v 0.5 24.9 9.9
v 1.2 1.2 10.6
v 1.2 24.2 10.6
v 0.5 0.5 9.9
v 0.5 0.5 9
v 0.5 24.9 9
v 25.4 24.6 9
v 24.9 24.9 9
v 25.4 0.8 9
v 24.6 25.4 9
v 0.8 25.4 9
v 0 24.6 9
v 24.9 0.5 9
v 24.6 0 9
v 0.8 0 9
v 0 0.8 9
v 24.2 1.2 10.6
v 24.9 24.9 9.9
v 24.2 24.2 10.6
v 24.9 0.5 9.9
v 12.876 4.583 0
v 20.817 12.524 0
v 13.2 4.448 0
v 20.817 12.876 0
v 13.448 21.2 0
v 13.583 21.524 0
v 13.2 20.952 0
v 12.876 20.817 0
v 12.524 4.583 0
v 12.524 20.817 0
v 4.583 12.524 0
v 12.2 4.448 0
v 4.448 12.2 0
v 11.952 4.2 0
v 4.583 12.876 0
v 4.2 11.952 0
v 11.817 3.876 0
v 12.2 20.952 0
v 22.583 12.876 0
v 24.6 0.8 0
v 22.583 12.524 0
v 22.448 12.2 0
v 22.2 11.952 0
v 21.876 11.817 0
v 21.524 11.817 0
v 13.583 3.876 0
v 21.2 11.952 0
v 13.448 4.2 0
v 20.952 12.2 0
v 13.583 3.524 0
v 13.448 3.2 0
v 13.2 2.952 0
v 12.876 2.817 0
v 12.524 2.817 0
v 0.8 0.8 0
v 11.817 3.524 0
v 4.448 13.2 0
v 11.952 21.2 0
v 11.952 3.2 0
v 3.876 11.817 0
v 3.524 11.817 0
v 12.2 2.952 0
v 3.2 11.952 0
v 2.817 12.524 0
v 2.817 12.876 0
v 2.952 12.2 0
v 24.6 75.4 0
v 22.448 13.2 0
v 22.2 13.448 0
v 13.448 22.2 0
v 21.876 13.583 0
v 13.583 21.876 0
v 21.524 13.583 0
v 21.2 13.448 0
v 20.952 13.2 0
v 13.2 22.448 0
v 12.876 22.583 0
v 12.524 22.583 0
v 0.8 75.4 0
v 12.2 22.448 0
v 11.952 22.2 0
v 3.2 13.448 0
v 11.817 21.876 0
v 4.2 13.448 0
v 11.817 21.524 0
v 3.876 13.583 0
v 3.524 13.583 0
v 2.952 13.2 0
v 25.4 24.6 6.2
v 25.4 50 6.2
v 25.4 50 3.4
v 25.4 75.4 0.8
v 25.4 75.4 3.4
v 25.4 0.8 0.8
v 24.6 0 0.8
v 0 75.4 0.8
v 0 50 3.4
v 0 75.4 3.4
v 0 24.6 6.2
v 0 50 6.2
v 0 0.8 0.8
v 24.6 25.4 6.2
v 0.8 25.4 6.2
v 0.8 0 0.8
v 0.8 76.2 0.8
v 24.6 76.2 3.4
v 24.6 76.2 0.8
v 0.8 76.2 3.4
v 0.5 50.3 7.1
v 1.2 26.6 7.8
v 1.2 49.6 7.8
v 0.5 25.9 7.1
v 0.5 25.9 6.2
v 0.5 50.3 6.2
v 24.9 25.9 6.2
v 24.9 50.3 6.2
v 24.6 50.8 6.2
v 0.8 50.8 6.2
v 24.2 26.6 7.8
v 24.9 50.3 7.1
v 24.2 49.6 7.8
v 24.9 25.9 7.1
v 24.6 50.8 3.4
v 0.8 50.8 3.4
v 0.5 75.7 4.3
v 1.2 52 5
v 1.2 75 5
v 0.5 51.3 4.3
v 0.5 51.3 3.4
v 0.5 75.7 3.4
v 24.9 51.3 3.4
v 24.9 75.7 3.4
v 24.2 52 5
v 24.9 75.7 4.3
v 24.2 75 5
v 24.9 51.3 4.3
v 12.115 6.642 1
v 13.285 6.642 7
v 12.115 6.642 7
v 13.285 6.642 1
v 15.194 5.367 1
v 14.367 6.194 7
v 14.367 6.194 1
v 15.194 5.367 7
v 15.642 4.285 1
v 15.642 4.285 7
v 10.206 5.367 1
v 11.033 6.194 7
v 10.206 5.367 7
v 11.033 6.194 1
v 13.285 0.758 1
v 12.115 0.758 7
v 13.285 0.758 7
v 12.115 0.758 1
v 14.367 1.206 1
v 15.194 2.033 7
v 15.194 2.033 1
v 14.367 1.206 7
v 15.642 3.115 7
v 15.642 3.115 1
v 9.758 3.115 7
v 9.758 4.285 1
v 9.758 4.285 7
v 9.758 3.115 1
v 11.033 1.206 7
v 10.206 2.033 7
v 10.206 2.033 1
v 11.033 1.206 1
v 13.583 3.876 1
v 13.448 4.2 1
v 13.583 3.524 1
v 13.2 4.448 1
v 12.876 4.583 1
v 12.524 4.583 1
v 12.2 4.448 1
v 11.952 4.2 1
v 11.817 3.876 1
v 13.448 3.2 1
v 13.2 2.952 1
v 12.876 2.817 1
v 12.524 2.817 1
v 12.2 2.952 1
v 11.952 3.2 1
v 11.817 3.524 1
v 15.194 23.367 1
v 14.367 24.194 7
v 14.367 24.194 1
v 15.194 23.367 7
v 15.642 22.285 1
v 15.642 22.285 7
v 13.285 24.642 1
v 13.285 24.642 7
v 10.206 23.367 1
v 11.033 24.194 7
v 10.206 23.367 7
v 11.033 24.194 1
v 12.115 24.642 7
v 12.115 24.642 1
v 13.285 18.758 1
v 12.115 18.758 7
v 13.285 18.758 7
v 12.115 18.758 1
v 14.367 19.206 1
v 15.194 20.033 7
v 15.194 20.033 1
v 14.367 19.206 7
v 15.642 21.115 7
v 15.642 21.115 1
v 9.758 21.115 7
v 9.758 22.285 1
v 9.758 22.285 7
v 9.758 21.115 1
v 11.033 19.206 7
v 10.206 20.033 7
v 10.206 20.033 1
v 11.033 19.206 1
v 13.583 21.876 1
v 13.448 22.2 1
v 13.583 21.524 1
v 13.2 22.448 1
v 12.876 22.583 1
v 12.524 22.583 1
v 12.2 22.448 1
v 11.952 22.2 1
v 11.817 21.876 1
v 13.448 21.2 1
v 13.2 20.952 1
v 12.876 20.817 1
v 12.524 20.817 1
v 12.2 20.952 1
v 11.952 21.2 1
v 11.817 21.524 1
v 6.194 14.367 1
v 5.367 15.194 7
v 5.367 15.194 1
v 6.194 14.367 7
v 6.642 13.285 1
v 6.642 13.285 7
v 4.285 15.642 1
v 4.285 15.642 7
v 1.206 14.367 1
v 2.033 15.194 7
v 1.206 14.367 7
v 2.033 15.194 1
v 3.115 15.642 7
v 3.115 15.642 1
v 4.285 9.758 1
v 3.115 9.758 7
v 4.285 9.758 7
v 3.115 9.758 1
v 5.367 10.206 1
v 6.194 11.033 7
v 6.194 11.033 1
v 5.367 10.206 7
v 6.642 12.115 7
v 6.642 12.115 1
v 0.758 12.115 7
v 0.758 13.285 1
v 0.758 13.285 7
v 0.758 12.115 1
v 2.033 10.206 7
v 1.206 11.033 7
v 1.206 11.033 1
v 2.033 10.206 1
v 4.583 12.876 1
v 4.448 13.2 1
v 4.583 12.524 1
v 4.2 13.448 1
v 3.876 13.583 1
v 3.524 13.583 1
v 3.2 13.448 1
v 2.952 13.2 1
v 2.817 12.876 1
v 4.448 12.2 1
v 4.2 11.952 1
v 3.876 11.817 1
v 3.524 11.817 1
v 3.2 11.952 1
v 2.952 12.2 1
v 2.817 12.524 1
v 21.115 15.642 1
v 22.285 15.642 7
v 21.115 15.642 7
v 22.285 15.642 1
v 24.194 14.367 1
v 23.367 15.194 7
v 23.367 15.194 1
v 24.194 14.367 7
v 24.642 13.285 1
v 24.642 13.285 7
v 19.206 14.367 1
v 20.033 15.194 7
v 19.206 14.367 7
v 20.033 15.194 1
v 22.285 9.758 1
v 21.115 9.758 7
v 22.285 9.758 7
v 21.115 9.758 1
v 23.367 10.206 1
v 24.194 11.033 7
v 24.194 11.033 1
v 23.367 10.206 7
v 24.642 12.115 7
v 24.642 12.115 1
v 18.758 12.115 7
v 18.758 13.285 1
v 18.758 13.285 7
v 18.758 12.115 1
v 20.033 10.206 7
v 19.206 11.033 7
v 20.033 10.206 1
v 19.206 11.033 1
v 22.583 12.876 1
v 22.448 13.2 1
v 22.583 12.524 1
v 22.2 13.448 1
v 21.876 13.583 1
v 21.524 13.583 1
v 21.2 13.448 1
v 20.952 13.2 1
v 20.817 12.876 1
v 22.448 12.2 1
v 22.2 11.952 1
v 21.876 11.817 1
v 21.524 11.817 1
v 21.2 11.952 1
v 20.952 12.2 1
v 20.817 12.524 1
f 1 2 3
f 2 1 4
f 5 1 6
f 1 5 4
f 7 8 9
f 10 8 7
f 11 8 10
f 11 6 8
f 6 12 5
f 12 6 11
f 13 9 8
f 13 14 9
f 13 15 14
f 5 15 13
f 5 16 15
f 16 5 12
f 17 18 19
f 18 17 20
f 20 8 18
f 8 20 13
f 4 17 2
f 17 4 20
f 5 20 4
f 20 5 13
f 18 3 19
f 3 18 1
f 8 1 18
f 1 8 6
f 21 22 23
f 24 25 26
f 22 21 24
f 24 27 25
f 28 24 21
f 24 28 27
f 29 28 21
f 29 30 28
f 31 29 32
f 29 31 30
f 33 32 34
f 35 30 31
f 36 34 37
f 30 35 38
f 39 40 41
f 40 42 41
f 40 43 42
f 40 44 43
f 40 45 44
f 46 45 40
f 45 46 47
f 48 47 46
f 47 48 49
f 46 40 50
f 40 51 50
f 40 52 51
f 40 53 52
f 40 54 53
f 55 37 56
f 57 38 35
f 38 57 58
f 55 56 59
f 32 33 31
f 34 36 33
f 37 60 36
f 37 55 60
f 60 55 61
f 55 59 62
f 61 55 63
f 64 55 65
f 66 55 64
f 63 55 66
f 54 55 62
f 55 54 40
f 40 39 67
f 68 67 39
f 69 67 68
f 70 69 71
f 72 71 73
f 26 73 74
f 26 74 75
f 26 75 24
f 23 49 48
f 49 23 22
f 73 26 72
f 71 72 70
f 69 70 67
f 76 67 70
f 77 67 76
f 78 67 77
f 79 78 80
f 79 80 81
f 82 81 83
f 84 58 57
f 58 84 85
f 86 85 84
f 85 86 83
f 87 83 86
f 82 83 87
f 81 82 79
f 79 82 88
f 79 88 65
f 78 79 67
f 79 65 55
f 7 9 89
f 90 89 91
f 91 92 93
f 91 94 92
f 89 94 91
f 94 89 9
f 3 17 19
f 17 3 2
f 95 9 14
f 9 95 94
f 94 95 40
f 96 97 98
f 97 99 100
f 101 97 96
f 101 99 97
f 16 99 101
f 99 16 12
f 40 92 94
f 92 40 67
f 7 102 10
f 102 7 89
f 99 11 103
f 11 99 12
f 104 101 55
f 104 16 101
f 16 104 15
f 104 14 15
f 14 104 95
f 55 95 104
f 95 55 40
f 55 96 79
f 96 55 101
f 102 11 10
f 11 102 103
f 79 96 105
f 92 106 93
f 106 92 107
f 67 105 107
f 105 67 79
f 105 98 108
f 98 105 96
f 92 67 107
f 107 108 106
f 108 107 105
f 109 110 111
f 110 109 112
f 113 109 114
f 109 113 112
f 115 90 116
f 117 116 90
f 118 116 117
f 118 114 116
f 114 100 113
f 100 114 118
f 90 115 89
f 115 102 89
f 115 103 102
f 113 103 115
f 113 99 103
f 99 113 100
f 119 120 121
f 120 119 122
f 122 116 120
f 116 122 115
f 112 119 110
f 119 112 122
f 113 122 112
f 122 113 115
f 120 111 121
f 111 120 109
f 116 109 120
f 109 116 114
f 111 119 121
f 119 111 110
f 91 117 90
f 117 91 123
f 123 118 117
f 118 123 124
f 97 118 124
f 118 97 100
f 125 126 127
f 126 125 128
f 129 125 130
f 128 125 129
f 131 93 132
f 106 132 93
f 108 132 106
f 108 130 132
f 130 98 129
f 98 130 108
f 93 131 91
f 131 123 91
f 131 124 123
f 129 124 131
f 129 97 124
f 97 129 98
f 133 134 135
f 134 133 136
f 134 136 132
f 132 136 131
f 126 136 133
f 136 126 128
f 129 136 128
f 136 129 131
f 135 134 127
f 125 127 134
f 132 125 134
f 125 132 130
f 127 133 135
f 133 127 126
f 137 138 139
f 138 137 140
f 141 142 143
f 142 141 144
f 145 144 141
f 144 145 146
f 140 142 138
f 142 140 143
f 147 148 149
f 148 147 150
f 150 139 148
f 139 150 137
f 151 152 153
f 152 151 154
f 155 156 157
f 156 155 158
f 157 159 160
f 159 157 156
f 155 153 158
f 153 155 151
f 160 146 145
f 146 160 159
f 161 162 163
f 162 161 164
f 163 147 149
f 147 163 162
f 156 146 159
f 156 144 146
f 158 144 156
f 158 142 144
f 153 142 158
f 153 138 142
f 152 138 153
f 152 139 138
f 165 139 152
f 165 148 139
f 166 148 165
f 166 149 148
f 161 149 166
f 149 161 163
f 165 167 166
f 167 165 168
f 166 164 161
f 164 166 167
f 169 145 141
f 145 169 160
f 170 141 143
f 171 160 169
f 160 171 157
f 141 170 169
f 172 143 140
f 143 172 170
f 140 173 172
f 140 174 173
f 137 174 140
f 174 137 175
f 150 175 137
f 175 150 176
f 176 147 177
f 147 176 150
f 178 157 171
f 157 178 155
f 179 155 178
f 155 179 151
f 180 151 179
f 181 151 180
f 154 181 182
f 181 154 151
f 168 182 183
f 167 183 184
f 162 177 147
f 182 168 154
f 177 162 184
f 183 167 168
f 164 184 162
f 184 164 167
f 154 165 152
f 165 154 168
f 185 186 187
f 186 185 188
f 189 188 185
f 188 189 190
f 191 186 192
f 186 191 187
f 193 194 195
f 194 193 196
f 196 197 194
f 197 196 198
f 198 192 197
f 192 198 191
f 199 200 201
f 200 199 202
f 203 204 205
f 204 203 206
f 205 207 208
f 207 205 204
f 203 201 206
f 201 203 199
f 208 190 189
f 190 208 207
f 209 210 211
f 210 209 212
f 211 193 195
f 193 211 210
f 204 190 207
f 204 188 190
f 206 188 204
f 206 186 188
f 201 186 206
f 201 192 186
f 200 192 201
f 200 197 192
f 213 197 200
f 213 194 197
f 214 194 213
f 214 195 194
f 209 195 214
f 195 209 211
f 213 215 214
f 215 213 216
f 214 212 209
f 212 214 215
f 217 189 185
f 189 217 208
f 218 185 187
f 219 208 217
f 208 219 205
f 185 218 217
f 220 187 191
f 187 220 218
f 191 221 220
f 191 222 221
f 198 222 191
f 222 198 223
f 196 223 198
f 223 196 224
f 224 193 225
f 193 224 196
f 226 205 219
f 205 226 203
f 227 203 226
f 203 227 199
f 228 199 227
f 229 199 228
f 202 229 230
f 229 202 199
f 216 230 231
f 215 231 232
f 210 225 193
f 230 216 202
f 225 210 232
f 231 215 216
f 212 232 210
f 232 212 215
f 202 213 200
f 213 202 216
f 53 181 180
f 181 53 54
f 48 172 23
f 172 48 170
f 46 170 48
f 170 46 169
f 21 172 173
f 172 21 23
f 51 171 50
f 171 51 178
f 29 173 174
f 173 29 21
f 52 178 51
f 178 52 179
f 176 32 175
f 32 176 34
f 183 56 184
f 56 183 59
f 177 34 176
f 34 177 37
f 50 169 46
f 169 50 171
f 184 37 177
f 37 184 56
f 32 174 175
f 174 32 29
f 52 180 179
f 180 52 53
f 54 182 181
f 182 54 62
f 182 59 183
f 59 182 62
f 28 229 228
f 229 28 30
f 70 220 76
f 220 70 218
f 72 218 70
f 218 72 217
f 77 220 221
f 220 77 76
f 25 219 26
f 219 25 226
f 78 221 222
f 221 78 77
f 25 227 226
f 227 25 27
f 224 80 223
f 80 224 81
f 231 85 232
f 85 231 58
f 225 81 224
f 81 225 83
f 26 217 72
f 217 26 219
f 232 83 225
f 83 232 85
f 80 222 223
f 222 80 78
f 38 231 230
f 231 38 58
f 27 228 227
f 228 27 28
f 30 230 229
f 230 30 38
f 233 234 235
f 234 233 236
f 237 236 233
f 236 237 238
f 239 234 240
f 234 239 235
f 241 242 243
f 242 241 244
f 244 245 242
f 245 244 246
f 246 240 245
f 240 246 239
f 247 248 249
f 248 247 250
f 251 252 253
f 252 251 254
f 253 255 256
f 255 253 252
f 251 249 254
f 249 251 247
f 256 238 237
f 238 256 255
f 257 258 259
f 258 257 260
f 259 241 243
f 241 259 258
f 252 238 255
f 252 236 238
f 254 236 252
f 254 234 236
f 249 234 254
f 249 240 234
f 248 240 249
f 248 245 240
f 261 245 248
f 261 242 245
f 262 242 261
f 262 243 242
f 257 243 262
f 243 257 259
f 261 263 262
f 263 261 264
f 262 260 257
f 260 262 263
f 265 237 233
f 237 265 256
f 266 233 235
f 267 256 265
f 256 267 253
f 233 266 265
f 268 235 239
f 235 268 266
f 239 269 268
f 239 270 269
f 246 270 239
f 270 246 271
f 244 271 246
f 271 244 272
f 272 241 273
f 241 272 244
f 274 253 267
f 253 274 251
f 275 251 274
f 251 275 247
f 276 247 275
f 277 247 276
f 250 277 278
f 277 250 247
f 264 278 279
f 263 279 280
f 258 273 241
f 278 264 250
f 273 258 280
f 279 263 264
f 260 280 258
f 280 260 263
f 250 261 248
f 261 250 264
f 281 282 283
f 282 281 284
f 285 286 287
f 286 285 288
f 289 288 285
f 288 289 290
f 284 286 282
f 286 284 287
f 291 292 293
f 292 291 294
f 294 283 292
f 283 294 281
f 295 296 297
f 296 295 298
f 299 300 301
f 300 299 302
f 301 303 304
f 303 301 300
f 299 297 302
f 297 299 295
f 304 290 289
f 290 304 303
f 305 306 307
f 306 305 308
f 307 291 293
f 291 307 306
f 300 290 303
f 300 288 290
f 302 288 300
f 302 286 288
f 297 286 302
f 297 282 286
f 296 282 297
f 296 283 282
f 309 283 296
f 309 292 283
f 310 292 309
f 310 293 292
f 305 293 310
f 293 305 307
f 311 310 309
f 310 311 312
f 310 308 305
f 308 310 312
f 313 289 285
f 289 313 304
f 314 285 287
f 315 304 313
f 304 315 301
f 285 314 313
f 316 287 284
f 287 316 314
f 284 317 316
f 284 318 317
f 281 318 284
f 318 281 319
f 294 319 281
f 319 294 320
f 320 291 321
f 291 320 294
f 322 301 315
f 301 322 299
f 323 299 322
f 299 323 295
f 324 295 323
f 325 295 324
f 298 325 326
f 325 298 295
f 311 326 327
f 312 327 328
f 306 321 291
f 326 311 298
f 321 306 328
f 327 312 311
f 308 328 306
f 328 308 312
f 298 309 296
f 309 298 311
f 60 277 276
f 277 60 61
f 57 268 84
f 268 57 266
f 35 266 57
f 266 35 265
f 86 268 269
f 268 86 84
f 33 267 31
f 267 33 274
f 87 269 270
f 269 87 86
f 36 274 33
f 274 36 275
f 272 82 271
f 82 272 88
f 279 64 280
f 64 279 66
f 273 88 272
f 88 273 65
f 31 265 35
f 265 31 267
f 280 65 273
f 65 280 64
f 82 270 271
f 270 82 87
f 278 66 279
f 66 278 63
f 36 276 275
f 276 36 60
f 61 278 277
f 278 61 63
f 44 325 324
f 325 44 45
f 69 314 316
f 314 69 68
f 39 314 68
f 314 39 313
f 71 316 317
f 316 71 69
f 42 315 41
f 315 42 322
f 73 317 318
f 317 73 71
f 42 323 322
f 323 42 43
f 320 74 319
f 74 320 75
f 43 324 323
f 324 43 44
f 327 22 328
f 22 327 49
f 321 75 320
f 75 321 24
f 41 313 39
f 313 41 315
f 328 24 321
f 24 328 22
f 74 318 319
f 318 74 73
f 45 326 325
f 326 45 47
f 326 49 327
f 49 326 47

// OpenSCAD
// file: stairs_01_solid.scad
include <libs.scad>;
use <floor_01_solid.scad>;
use <wall_01_solid.scad>;

open_ascending_stair(1,4);
*translate([basis*2,0,0])open_descending_stair(1,3);
*linear_wall(4);

module open_ascending_stair(width,steps)
{
  for(aa=[1:steps])
  {
    translate([0,basis*(aa-1),step_up*(aa-1)])square_floor(width,steps-(aa-1));
  }
}
module open_descending_stair(width,steps)
{
  for(aa=[1:steps])
  {
    intersection()
    {
      translate([0,0,-step_up*(aa-1)])square_floor(width,aa);
      square_floor(width,steps);
    }
  }
}
// file: wall_01_solid.scad
include <libs.scad>;

//wall
*linear_wall(4);
*round_wall(2);
corner_wall(1);

module linear_wall_base(size)
{
    translate([-wall_width/2,size*basis/2,wall_height/2])hull()
    {
        cube([wall_width-bevel*2,size*basis,wall_height-bevel*2],center=true);
        cube([wall_width-bevel*2,size*basis-bevel*2,wall_height],center=true);
        cube([wall_width,size*basis-bevel*2,wall_height-bevel*2],center=true);
    }
}

module round_wall_base(size)
{
    difference()
    {
        hull()
        {
            translate([0,0,bevel])cylinder(r=size*basis+wall_width,h=wall_height-bevel*2);
            cylinder(r=size*basis+wall_width-bevel,h=wall_height);
        }
        cylinder(r=size*basis,h=wall_height);
        translate([0,0,-ep])cylinder(r1=size*basis+bevel,r2=size*basis,h=bevel);
        translate([0,0,wall_height-bevel+ep])cylinder(r2=size*basis+bevel,r1=size*basis,h=bevel);
    }
}

module linear_brick_grids(size)
{
    //one for each wall level, horizontal
    brick_h=(wall_height-floor_thick)/wall_layers;
    for (ii=[0:wall_layers-1])
    {
        translate([0,size*basis/2,floor_thick+ii*brick_h])rotate([0,45,0])cube([wall_groove*sqrt(2),size*basis*2,wall_groove*sqrt(2)],center=true);
    }
    //vertical
    //one above floor is off by half, then even, then off
    for (ii=[1:1:wall_layers])
    {
        for(jj=[0:.5:size+1])
        {
            translate([0,jj*basis-(ii%6)*basis/6,floor_thick+ii*brick_h-brick_h/2])rotate([0,0,45])cube([wall_groove*sqrt(2),wall_groove*sqrt(2),brick_h],center=true);
        }
    }
}

module round_brick_grids(size)
{
    brick_h=(wall_height-floor_thick)/wall_layers;
    //horizontal
    for (ii=[0:wall_layers-1])
    {
        translate([0,0,floor_thick+ii*brick_h])hull()
        {
            cylinder(r=basis*size+wall_groove,h=ep,center=true);
            cylinder(r=basis*size,h=wall_groove*2,center=true);
        }
    }
    //vertical
    //vertical should be shifted each layer
    for (ii=[1:1:wall_layers])
    {
        for(jj=[0:30/size:120])
        {
            rotate([0,0,jj+(ii%6)*(10/size)])translate([basis*size,0,floor_thick+ii*brick_h-brick_h/2])rotate([0,0,45])cube([wall_groove*sqrt(2),wall_groove*sqrt(2),brick_h],center=true);
        }
    }
}

module round_wall(size)
{
    xx=basis*size+wall_width;
    yy=basis*size+wall_width;
    zz=wall_height;
    difference()
    {
        intersection()
        {
            round_wall_base(size);
            translate([.5*(basis*size+wall_width),.5*(basis*size+wall_width),wall_height/2])hull()
            {
                cube([xx-bevel*2,yy,zz-bevel*2],center=true);
                cube([xx-bevel*2,yy-bevel*2,zz],center=true);
                cube([xx,yy-bevel*2,zz-bevel*2],center=true);
            }
        }
        hull()
        {
            cube([basis*size*2+bevel*2,ep,zz*3],center=true);
            cube([ep,basis*size*2+bevel*2,zz*3],center=true);
        }
        round_brick_grids(size);
    }
}

module linear_wall(size)
{
    difference()
    {
        linear_wall_base(size);
        linear_brick_grids(size);
        *translate([-wall_width,0,0])linear_brick_grids(size);
    }
}

module corner_wall(size)
{
  intersection()
  {
    linear_wall(size);
    //45 degree slope so we can do inside corners
    translate([0,0,0])hull()
    {
      //beveling
      translate([0,0,-ep])linear_extrude(wall_height+ep*2)offset(delta=-bevel)hull()
      {
        translate([0,basis*0.5*size])square([ep,basis*size-wall_tol*2],center=true);
        translate([-wall_width,basis*0.5*size])square([ep,basis*size-wall_tol*2-wall_width*2],center=true);
      }
      translate([0,0,bevel])linear_extrude(wall_height-bevel*2)hull()
      {
        translate([0,basis*0.5*size])square([ep,basis*size-wall_tol*2],center=true);
        translate([-wall_width,basis*0.5*size])square([ep,basis*size-wall_tol*2-wall_width*2],center=true);
      }
    }
  }
}
// file: floor_01_solid.scad
include <libs.scad>;

//floor
*round(2);
diagonal(2,2);
*square_floor(2,2);

//import("AS_full.stl");


module square_floor(xsize,ysize)
{
  difference()
  {
    floor_plate(xsize,ysize);
    grids(xsize,ysize);
  }
}
module diagonal(xsize,ysize)
{
  intersection()
  {
    difference()
    {
      floor_plate(xsize,ysize);
      grids(xsize,ysize);
    }
    translate([0,0,floor_thick/2])hull()
    {
      //we want a slanted portion, so we'll hull two thin slivers that reach to the length
      cube([2*xsize*basis-bevel*2*sqrt(2),ep,floor_thick],center=true);
      cube([2*xsize*basis,ep,floor_thick-bevel*2],center=true);
      cube([ep,2*ysize*basis-bevel*2*sqrt(2),floor_thick],center=true);
      cube([ep,2*ysize*basis,floor_thick-bevel*2],center=true);
    }
    translate([0,0,floor_thick/2])cube([xsize*2*basis-bevel*2,ysize*2*basis-bevel*2,floor_thick],center=true);
  }
}
module round(radius)
{
  intersection()
  {
    difference()
    {
      floor_plate(radius,radius);
      grids(radius,radius);
    }
    hull()
    {
      translate([0,0,bevel])cylinder(r=radius*basis,h=floor_thick-bevel*2,$fn=200);
      cylinder(r=radius*basis-bevel,h=floor_thick,$fn=200);
    }
  }
}
// main file
include <libs.scad>;
use <floor_01_solid.scad>;
use <wall_01_solid.scad>;
use <stairs_01_solid.scad>;

//open_ascending_final(1,4);
open_descending_final(1,3);

module open_ascending_final(width,steps)
{
  intersection()
  {
    import("stairs_up.stl");
    translate([0,0,50+floor_thick-floor_depth-ep])cube([width*3*basis,steps*3*basis,100],center=true);
  }

  intersection()
  {
    cube([width*3*basis,steps*3*basis,2*(floor_thick-floor_depth-ep)],center=true);
    difference()
    {
      square_floor(width,steps);
      square_mag_holes(width,steps);
      square_openlocks(width,steps);
    }
  }
}

module open_descending_final(width,steps)
{
  difference()
  {
    open_descending_stair(width,steps);
    square_mag_holes(width,1);
    square_openlocks(width,1);
  }
}
